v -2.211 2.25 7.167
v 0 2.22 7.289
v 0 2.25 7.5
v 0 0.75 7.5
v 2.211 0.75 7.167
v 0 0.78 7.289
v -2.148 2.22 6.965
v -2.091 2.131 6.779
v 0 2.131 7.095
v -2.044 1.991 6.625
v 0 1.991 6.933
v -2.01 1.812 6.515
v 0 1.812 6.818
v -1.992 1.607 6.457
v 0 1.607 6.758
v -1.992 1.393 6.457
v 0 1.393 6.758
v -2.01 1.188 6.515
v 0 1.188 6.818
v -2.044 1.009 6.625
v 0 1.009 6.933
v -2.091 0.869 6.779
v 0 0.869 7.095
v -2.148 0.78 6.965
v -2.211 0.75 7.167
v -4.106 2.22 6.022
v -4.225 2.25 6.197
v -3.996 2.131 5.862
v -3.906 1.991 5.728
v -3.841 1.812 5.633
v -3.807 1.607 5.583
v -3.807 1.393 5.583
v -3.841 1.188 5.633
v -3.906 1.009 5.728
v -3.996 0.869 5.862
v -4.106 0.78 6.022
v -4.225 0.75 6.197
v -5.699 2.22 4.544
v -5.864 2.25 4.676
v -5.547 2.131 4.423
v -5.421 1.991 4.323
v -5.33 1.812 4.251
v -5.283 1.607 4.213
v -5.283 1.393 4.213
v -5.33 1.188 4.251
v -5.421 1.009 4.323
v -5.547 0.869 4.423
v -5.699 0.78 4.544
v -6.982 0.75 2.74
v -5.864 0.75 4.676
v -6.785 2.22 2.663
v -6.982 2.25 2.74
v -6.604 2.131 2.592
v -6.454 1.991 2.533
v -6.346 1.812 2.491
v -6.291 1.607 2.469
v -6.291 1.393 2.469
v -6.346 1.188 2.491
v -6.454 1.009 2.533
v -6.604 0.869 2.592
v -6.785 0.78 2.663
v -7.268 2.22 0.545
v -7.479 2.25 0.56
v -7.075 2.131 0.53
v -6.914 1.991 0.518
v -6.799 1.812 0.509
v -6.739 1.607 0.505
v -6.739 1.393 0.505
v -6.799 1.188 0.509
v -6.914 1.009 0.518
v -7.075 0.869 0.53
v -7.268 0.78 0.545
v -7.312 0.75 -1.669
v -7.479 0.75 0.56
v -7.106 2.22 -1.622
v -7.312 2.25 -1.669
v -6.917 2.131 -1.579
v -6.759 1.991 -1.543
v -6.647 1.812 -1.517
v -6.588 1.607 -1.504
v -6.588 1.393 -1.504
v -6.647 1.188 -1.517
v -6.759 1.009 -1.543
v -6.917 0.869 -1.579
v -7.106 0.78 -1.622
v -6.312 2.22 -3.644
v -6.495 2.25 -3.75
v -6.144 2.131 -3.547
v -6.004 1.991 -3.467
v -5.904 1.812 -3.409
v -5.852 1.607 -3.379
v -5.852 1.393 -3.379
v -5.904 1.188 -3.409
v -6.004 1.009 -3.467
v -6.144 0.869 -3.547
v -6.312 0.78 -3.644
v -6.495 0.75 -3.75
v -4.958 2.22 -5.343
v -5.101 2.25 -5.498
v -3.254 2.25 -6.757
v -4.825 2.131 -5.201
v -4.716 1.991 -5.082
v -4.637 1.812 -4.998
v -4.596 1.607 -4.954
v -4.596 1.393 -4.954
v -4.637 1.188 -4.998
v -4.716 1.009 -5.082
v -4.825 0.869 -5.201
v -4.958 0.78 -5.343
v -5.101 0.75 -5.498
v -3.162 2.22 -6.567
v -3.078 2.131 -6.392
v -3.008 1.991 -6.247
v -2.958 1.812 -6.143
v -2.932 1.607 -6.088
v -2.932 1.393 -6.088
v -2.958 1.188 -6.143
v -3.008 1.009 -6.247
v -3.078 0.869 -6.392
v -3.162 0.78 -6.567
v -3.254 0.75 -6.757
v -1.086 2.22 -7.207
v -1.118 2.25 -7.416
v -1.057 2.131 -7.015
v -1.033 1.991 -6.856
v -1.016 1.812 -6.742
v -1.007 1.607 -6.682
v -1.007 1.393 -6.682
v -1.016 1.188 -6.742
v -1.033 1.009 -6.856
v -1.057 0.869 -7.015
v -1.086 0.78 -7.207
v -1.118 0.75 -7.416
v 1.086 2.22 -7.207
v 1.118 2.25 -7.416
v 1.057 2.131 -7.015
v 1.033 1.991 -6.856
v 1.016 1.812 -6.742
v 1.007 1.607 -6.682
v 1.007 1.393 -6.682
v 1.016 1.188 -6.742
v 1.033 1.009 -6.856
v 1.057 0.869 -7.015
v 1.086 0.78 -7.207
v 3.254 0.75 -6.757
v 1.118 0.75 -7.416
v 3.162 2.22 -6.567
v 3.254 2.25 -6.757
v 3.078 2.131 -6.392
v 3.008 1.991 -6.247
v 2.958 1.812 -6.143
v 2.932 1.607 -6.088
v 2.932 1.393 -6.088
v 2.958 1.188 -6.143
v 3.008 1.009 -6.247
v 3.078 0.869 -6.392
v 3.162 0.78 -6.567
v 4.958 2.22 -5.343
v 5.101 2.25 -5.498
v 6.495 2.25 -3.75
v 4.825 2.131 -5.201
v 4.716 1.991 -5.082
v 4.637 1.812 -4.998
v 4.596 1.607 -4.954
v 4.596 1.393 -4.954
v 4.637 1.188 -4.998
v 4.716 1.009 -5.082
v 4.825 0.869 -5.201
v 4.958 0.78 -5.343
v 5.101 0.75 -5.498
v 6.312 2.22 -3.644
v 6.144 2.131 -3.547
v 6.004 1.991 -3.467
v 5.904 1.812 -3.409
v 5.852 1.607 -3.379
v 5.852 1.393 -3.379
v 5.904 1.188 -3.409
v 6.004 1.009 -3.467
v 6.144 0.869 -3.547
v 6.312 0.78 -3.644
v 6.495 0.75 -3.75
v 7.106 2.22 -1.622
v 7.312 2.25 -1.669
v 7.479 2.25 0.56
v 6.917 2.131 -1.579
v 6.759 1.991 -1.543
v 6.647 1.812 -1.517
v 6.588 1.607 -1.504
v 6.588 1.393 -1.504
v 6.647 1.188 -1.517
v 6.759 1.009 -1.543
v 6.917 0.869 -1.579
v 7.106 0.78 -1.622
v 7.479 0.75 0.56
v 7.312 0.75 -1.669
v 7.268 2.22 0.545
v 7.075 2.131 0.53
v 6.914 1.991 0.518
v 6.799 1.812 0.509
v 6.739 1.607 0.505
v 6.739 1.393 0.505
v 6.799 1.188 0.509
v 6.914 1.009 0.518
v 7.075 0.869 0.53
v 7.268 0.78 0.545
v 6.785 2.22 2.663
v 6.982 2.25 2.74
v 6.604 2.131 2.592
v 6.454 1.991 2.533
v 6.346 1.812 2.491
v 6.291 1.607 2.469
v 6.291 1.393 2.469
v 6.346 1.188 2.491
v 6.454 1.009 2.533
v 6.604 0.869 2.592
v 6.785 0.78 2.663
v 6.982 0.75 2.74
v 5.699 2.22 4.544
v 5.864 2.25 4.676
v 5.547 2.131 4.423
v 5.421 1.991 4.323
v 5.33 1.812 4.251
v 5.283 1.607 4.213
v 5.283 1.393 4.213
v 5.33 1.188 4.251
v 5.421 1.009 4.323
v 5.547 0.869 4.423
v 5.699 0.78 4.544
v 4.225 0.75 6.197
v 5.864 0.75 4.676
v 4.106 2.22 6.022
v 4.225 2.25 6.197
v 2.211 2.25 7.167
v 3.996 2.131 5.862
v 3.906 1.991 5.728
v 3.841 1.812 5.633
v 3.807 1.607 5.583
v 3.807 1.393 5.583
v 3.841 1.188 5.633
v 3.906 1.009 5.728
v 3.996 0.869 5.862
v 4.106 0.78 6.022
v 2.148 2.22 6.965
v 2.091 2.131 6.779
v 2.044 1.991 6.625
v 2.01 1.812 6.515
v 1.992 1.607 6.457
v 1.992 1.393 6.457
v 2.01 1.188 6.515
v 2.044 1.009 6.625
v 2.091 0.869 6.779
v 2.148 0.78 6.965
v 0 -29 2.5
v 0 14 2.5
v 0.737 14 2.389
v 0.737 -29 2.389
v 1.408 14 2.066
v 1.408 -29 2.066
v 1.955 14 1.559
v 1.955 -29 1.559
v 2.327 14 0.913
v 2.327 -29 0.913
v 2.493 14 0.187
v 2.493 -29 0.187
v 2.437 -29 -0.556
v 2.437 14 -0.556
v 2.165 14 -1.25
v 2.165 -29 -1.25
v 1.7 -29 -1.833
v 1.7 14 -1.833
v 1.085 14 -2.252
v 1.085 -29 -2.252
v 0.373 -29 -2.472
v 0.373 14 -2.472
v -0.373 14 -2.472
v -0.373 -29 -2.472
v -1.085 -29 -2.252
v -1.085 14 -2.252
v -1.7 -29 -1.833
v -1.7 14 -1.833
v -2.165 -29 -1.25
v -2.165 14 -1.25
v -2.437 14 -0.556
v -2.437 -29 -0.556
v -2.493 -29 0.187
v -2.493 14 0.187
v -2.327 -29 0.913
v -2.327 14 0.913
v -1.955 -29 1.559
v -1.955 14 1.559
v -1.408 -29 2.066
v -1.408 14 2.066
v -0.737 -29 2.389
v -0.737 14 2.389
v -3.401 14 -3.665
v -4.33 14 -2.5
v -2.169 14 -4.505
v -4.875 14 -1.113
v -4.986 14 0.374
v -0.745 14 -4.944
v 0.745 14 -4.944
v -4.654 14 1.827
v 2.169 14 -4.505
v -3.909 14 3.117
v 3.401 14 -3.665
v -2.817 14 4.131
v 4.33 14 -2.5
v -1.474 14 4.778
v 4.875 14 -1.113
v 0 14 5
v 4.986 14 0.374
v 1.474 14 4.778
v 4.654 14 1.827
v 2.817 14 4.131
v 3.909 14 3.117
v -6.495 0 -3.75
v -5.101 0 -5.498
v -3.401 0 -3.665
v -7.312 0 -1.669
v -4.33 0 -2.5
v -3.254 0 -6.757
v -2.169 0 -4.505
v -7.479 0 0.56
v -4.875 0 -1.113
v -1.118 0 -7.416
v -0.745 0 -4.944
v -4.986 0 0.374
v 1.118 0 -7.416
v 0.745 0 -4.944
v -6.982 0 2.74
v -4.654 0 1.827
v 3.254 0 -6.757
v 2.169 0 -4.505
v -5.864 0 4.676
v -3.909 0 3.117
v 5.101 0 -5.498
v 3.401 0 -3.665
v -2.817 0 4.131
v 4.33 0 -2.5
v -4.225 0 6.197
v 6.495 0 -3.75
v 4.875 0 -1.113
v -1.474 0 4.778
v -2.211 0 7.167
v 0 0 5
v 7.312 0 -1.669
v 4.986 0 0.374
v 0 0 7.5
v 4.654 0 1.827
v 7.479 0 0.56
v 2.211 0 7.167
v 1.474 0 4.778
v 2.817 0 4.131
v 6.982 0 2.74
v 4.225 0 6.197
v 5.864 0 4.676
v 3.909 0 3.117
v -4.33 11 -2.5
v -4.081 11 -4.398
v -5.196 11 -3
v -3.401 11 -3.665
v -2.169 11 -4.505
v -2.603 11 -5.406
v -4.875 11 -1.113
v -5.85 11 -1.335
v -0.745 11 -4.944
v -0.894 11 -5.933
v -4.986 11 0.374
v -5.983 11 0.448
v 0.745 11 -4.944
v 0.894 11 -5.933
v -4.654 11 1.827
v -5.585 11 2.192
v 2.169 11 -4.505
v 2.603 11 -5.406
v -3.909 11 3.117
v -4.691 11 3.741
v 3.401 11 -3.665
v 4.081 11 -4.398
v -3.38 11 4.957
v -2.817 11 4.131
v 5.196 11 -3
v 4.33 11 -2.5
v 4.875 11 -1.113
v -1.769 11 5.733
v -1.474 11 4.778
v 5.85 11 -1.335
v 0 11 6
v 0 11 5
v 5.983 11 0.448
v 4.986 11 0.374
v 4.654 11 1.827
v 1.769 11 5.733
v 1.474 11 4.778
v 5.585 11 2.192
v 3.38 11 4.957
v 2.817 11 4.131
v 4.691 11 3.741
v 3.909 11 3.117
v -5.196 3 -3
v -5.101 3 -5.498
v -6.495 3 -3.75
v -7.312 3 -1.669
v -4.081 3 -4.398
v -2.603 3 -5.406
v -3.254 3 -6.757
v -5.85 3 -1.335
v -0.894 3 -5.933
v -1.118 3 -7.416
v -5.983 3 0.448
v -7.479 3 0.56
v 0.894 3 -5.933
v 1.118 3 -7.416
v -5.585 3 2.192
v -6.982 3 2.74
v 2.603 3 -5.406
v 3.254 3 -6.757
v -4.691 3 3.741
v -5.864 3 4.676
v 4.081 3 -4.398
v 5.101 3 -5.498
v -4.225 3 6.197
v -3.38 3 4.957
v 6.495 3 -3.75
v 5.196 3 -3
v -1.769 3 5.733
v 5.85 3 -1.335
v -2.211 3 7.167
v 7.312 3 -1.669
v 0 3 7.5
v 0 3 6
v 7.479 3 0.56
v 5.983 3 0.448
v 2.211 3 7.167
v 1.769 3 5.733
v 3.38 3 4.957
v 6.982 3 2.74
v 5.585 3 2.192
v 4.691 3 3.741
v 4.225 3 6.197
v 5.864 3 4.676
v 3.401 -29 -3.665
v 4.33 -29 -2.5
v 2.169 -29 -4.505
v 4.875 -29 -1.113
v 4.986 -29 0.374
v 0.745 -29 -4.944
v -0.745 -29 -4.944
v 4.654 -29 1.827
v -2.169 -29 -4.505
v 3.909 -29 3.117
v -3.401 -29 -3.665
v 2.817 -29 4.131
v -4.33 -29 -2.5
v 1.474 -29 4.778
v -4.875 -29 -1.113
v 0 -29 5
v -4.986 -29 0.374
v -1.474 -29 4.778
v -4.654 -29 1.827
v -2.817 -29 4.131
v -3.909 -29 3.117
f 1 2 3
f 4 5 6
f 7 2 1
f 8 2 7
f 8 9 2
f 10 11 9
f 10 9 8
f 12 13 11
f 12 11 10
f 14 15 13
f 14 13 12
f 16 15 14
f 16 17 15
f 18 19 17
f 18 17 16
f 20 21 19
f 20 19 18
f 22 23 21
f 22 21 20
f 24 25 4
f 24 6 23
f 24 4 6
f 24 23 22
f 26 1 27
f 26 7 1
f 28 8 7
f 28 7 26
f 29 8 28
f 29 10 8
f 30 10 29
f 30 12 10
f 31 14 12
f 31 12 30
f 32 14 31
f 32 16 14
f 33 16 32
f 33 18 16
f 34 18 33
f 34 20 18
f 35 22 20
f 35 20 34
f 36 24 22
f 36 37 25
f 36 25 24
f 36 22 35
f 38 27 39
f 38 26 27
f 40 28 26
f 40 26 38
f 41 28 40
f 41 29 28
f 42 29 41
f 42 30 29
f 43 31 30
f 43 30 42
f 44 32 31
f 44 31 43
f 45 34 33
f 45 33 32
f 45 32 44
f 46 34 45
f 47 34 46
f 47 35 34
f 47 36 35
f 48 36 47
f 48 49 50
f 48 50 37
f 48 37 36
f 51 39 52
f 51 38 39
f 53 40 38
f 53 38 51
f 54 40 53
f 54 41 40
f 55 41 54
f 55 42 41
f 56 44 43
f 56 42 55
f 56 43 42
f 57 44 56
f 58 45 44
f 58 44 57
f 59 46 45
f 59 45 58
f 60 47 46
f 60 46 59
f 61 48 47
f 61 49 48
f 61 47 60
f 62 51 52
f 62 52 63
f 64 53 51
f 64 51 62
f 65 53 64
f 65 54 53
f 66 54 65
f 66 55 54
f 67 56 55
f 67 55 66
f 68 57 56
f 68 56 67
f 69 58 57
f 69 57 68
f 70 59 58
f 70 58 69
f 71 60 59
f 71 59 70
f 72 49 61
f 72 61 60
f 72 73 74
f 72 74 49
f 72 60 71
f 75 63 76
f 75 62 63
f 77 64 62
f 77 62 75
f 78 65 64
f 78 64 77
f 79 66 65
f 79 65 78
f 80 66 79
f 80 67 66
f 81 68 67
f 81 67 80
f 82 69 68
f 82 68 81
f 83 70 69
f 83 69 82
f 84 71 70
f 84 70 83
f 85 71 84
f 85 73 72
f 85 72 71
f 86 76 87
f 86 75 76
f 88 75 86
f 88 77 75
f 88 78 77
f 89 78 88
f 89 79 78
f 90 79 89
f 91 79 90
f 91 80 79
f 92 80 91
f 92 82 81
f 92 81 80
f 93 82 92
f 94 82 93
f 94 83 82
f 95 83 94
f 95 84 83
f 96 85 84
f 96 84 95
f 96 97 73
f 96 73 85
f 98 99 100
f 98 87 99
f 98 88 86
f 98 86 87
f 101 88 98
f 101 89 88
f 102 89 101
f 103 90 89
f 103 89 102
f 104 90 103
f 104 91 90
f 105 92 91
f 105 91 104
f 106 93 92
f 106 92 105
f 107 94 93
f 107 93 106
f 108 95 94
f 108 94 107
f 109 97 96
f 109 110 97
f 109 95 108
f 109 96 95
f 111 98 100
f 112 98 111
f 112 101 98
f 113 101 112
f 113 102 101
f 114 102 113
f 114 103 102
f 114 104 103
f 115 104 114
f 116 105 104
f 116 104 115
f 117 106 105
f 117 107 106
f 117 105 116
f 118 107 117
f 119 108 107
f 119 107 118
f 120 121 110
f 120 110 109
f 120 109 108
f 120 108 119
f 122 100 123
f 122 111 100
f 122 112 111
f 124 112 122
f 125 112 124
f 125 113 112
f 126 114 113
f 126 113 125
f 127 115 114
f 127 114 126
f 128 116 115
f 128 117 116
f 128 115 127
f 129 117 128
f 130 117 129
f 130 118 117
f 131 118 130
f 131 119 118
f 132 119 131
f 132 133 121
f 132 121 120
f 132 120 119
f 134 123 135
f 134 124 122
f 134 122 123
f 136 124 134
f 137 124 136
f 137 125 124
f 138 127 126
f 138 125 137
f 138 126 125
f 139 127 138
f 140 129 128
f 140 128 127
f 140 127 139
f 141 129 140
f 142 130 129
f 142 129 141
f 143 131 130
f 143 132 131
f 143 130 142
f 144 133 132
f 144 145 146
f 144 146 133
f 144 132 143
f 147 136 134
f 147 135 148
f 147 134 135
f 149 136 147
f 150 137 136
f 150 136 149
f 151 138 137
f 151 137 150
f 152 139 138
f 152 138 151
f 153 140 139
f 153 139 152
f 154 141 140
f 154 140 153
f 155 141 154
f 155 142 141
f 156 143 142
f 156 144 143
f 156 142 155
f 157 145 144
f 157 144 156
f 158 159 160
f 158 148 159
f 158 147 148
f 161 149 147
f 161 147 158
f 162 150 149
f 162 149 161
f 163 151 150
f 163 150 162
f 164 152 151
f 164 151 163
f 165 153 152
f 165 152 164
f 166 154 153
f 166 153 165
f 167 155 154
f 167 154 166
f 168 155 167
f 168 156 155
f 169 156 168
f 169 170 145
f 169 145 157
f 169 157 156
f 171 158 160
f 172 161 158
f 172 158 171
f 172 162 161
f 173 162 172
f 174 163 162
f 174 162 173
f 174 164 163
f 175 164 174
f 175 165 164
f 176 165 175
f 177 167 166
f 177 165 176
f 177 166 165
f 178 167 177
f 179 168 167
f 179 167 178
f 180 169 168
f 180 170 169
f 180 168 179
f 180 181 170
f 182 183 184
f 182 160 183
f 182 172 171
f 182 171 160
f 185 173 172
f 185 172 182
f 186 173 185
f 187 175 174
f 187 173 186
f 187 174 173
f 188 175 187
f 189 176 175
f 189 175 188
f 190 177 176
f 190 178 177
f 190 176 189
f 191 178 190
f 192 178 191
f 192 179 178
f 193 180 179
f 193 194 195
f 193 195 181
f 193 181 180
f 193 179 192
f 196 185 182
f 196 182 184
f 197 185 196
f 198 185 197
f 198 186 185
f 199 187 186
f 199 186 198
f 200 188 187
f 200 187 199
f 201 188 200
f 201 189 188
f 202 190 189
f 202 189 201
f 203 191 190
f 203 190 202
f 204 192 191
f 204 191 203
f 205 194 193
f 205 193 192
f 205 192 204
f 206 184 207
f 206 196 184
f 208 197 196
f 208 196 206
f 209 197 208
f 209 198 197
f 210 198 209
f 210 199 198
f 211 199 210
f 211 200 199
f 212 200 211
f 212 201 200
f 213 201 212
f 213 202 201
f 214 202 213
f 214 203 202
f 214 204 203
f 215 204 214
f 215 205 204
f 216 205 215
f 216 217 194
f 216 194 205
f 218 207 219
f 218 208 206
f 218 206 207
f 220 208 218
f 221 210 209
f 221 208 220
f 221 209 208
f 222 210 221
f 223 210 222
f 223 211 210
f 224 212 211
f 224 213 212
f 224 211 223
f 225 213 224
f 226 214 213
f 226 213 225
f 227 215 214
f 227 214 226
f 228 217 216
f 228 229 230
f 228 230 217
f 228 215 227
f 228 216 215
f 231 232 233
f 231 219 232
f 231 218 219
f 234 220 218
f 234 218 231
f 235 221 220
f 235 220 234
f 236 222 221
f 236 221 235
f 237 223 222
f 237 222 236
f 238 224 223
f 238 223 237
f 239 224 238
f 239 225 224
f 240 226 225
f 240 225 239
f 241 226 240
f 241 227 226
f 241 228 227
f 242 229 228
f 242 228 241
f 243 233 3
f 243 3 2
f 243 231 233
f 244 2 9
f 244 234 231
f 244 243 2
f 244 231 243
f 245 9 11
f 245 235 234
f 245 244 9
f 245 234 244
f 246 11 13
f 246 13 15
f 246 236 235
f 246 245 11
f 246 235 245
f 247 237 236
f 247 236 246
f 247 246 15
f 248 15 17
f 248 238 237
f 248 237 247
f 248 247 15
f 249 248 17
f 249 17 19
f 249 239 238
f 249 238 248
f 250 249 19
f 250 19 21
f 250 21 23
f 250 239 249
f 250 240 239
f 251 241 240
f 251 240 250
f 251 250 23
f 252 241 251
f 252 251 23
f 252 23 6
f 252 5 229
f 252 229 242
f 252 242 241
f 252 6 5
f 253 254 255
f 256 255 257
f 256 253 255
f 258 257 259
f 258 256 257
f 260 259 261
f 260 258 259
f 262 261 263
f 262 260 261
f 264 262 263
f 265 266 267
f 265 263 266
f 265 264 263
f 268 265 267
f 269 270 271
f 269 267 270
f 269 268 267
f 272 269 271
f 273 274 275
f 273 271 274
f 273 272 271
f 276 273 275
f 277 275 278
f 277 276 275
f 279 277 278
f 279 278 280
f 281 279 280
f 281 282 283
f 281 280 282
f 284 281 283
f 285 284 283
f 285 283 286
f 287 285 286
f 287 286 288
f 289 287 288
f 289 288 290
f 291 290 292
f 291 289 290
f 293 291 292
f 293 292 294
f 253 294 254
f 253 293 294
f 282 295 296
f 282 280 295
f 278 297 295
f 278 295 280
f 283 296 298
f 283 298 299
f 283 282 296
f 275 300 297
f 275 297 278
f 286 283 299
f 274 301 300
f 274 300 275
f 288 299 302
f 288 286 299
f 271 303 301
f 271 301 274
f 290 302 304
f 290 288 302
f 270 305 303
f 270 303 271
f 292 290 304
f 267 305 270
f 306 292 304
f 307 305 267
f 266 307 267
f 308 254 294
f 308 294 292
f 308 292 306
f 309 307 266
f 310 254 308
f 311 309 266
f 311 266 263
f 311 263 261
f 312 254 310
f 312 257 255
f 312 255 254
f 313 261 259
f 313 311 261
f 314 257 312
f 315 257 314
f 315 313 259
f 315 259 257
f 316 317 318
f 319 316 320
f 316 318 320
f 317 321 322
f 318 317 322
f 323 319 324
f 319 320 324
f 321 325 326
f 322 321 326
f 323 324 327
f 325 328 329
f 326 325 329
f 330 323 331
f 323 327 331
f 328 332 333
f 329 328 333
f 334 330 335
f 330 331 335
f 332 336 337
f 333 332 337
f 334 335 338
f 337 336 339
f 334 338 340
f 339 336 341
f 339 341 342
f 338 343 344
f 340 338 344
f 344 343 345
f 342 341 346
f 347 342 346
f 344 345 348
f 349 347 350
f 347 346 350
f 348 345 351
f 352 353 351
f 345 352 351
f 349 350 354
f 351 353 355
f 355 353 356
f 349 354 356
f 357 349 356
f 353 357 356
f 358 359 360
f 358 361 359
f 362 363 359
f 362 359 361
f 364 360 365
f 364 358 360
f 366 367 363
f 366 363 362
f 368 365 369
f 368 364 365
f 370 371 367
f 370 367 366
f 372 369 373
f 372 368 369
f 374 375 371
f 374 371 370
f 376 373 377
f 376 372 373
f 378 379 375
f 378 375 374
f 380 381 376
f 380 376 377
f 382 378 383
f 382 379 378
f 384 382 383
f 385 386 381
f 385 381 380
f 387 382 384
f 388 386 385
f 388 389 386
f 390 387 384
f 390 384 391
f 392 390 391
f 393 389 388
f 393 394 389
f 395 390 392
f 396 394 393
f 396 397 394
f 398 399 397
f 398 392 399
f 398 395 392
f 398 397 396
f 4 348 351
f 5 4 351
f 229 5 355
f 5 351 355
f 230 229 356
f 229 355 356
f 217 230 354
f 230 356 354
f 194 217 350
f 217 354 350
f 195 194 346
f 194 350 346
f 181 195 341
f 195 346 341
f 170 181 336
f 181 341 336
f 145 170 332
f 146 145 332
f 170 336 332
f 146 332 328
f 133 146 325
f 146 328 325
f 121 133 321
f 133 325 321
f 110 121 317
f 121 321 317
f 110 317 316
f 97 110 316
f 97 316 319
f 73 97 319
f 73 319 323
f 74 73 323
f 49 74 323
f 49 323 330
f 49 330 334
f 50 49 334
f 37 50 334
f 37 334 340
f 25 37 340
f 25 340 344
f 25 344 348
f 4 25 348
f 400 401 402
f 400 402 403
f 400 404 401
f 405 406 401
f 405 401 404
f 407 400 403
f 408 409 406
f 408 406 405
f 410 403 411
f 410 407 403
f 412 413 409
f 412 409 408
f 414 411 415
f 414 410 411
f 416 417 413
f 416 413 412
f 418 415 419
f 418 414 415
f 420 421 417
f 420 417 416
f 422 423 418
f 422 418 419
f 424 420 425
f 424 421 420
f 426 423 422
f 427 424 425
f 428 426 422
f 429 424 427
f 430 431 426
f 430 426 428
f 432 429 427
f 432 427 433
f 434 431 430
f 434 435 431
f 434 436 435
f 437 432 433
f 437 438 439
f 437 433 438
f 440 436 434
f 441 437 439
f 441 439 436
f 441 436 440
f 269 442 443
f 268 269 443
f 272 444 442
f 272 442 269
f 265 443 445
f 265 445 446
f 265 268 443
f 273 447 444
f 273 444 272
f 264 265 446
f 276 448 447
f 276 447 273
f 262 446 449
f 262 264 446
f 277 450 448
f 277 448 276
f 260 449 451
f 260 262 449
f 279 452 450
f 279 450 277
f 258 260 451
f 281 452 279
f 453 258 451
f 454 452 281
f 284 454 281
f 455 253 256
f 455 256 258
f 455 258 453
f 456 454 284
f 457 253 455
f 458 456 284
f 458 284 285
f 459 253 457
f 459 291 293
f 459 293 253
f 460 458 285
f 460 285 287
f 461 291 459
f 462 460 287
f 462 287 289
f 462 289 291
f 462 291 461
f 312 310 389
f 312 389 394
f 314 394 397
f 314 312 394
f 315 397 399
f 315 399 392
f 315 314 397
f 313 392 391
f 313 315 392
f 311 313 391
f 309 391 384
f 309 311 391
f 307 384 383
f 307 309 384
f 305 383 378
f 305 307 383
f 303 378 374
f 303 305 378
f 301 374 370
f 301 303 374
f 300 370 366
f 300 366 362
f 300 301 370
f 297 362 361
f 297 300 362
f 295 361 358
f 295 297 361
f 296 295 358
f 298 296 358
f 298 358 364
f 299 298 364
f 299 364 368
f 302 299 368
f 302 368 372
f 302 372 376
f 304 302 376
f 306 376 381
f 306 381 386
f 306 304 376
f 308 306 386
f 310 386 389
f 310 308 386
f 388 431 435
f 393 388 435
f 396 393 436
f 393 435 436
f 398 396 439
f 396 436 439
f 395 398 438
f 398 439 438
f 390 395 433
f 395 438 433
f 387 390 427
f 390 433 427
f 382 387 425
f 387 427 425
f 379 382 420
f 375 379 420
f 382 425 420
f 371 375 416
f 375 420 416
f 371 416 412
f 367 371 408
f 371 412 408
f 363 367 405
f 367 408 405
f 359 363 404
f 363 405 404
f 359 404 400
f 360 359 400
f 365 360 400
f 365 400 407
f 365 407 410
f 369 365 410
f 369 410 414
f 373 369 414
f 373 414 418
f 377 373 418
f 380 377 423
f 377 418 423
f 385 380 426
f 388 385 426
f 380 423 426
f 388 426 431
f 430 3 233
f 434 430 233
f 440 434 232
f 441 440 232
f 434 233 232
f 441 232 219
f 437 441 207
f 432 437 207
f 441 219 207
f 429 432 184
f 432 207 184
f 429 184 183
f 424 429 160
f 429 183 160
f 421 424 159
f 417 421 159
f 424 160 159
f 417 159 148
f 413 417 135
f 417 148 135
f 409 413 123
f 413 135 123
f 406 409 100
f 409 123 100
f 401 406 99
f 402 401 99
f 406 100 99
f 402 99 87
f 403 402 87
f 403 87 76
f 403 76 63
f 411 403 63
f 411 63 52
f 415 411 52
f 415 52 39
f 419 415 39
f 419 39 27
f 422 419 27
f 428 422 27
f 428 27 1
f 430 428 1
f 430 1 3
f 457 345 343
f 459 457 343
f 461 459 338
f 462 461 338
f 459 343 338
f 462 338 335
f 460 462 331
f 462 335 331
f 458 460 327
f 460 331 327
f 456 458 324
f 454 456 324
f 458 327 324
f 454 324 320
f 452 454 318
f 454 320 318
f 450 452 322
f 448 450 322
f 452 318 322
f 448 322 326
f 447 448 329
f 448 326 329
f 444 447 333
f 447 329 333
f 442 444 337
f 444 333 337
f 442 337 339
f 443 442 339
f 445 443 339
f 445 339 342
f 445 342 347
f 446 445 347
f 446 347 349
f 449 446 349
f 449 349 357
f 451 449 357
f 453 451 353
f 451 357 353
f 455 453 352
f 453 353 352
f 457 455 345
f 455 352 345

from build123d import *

# Parameters (mm, degrees)
CROQUIS1_R              = 7.5
SALIENTE_EXTRUIR1_DEPTH = 3
CROQUIS2_R              = 0.75
CROQUIS4_R              = 5
SALIENTE_EXTRUIR2_DEPTH = 29
CROQUIS5_R              = 6
SALIENTE_EXTRUIR3_DEPTH = 8
SALIENTE_EXTRUIR4_START = 3
CROQUIS6_R              = 5
SALIENTE_EXTRUIR4_DEPTH = 3
CROQUIS3_R              = 2.5
CORTAR_EXTRUIR1_DEPTH   = 45.288824776


with BuildPart() as part:
    # Croquis1 → Saliente-Extruir1 (new body)
    with BuildSketch(Plane(origin=(0, 0, 0), x_dir=(1, 0, 0), z_dir=(0, 1, 0))):
        with Locations(Location((0, 0, 0), (0, 0, 270))):
            Circle(CROQUIS1_R)
    extrude(amount=SALIENTE_EXTRUIR1_DEPTH)

    # Croquis2 → Cortar-Revolución1 (revolve, cut)
    with BuildSketch(Plane(origin=(0, 0, 0), x_dir=(0, 0, -1), z_dir=(1, 0, 0)), mode=Mode.PRIVATE) as cortar_revoluci_n1_sk:
        with Locations((7.5, 1.5)):
            Circle(CROQUIS2_R)
    revolve(cortar_revoluci_n1_sk.sketch.rotate(Axis((0, 3, 0), (0, -1, 0)), 180), axis=Axis((0, 3, 0), (0, -1, 0)), mode=Mode.SUBTRACT)

    # Croquis4 → Saliente-Extruir2 (add)
    with BuildSketch(Plane.XZ):
        with Locations(Location((0, 0, 0), (0, 0, 90))):
            Circle(CROQUIS4_R)
    extrude(amount=SALIENTE_EXTRUIR2_DEPTH)

    # Croquis5 → Saliente-Extruir3 (add)
    with BuildSketch(Plane(origin=(0, 3, 0), x_dir=(1, 0, 0), z_dir=(0, 1, 0))):
        with Locations(Location((0, 0, 0), (0, 0, 270))):
            Circle(CROQUIS5_R)
    extrude(amount=SALIENTE_EXTRUIR3_DEPTH)

    # Croquis6 → Saliente-Extruir4 (add)
    with BuildSketch(Plane(origin=(0, 11, 0), x_dir=(1, 0, 0), z_dir=(0, 1, 0)).offset(SALIENTE_EXTRUIR4_START)):
        with Locations(Location((0, 0, 0), (0, 0, 270))):
            Circle(CROQUIS6_R)
    extrude(amount=-SALIENTE_EXTRUIR4_DEPTH)

    # Croquis3 → Cortar-Extruir1 (cut, through all)
    with BuildSketch(Plane(origin=(0, -29, 0), x_dir=(1, 0, 0), z_dir=(0, 1, 0))):
        with Locations(Location((0, 0, 0), (0, 0, 270))):
            Circle(CROQUIS3_R)
    extrude(amount=CORTAR_EXTRUIR1_DEPTH, mode=Mode.SUBTRACT)


solid = part.part
